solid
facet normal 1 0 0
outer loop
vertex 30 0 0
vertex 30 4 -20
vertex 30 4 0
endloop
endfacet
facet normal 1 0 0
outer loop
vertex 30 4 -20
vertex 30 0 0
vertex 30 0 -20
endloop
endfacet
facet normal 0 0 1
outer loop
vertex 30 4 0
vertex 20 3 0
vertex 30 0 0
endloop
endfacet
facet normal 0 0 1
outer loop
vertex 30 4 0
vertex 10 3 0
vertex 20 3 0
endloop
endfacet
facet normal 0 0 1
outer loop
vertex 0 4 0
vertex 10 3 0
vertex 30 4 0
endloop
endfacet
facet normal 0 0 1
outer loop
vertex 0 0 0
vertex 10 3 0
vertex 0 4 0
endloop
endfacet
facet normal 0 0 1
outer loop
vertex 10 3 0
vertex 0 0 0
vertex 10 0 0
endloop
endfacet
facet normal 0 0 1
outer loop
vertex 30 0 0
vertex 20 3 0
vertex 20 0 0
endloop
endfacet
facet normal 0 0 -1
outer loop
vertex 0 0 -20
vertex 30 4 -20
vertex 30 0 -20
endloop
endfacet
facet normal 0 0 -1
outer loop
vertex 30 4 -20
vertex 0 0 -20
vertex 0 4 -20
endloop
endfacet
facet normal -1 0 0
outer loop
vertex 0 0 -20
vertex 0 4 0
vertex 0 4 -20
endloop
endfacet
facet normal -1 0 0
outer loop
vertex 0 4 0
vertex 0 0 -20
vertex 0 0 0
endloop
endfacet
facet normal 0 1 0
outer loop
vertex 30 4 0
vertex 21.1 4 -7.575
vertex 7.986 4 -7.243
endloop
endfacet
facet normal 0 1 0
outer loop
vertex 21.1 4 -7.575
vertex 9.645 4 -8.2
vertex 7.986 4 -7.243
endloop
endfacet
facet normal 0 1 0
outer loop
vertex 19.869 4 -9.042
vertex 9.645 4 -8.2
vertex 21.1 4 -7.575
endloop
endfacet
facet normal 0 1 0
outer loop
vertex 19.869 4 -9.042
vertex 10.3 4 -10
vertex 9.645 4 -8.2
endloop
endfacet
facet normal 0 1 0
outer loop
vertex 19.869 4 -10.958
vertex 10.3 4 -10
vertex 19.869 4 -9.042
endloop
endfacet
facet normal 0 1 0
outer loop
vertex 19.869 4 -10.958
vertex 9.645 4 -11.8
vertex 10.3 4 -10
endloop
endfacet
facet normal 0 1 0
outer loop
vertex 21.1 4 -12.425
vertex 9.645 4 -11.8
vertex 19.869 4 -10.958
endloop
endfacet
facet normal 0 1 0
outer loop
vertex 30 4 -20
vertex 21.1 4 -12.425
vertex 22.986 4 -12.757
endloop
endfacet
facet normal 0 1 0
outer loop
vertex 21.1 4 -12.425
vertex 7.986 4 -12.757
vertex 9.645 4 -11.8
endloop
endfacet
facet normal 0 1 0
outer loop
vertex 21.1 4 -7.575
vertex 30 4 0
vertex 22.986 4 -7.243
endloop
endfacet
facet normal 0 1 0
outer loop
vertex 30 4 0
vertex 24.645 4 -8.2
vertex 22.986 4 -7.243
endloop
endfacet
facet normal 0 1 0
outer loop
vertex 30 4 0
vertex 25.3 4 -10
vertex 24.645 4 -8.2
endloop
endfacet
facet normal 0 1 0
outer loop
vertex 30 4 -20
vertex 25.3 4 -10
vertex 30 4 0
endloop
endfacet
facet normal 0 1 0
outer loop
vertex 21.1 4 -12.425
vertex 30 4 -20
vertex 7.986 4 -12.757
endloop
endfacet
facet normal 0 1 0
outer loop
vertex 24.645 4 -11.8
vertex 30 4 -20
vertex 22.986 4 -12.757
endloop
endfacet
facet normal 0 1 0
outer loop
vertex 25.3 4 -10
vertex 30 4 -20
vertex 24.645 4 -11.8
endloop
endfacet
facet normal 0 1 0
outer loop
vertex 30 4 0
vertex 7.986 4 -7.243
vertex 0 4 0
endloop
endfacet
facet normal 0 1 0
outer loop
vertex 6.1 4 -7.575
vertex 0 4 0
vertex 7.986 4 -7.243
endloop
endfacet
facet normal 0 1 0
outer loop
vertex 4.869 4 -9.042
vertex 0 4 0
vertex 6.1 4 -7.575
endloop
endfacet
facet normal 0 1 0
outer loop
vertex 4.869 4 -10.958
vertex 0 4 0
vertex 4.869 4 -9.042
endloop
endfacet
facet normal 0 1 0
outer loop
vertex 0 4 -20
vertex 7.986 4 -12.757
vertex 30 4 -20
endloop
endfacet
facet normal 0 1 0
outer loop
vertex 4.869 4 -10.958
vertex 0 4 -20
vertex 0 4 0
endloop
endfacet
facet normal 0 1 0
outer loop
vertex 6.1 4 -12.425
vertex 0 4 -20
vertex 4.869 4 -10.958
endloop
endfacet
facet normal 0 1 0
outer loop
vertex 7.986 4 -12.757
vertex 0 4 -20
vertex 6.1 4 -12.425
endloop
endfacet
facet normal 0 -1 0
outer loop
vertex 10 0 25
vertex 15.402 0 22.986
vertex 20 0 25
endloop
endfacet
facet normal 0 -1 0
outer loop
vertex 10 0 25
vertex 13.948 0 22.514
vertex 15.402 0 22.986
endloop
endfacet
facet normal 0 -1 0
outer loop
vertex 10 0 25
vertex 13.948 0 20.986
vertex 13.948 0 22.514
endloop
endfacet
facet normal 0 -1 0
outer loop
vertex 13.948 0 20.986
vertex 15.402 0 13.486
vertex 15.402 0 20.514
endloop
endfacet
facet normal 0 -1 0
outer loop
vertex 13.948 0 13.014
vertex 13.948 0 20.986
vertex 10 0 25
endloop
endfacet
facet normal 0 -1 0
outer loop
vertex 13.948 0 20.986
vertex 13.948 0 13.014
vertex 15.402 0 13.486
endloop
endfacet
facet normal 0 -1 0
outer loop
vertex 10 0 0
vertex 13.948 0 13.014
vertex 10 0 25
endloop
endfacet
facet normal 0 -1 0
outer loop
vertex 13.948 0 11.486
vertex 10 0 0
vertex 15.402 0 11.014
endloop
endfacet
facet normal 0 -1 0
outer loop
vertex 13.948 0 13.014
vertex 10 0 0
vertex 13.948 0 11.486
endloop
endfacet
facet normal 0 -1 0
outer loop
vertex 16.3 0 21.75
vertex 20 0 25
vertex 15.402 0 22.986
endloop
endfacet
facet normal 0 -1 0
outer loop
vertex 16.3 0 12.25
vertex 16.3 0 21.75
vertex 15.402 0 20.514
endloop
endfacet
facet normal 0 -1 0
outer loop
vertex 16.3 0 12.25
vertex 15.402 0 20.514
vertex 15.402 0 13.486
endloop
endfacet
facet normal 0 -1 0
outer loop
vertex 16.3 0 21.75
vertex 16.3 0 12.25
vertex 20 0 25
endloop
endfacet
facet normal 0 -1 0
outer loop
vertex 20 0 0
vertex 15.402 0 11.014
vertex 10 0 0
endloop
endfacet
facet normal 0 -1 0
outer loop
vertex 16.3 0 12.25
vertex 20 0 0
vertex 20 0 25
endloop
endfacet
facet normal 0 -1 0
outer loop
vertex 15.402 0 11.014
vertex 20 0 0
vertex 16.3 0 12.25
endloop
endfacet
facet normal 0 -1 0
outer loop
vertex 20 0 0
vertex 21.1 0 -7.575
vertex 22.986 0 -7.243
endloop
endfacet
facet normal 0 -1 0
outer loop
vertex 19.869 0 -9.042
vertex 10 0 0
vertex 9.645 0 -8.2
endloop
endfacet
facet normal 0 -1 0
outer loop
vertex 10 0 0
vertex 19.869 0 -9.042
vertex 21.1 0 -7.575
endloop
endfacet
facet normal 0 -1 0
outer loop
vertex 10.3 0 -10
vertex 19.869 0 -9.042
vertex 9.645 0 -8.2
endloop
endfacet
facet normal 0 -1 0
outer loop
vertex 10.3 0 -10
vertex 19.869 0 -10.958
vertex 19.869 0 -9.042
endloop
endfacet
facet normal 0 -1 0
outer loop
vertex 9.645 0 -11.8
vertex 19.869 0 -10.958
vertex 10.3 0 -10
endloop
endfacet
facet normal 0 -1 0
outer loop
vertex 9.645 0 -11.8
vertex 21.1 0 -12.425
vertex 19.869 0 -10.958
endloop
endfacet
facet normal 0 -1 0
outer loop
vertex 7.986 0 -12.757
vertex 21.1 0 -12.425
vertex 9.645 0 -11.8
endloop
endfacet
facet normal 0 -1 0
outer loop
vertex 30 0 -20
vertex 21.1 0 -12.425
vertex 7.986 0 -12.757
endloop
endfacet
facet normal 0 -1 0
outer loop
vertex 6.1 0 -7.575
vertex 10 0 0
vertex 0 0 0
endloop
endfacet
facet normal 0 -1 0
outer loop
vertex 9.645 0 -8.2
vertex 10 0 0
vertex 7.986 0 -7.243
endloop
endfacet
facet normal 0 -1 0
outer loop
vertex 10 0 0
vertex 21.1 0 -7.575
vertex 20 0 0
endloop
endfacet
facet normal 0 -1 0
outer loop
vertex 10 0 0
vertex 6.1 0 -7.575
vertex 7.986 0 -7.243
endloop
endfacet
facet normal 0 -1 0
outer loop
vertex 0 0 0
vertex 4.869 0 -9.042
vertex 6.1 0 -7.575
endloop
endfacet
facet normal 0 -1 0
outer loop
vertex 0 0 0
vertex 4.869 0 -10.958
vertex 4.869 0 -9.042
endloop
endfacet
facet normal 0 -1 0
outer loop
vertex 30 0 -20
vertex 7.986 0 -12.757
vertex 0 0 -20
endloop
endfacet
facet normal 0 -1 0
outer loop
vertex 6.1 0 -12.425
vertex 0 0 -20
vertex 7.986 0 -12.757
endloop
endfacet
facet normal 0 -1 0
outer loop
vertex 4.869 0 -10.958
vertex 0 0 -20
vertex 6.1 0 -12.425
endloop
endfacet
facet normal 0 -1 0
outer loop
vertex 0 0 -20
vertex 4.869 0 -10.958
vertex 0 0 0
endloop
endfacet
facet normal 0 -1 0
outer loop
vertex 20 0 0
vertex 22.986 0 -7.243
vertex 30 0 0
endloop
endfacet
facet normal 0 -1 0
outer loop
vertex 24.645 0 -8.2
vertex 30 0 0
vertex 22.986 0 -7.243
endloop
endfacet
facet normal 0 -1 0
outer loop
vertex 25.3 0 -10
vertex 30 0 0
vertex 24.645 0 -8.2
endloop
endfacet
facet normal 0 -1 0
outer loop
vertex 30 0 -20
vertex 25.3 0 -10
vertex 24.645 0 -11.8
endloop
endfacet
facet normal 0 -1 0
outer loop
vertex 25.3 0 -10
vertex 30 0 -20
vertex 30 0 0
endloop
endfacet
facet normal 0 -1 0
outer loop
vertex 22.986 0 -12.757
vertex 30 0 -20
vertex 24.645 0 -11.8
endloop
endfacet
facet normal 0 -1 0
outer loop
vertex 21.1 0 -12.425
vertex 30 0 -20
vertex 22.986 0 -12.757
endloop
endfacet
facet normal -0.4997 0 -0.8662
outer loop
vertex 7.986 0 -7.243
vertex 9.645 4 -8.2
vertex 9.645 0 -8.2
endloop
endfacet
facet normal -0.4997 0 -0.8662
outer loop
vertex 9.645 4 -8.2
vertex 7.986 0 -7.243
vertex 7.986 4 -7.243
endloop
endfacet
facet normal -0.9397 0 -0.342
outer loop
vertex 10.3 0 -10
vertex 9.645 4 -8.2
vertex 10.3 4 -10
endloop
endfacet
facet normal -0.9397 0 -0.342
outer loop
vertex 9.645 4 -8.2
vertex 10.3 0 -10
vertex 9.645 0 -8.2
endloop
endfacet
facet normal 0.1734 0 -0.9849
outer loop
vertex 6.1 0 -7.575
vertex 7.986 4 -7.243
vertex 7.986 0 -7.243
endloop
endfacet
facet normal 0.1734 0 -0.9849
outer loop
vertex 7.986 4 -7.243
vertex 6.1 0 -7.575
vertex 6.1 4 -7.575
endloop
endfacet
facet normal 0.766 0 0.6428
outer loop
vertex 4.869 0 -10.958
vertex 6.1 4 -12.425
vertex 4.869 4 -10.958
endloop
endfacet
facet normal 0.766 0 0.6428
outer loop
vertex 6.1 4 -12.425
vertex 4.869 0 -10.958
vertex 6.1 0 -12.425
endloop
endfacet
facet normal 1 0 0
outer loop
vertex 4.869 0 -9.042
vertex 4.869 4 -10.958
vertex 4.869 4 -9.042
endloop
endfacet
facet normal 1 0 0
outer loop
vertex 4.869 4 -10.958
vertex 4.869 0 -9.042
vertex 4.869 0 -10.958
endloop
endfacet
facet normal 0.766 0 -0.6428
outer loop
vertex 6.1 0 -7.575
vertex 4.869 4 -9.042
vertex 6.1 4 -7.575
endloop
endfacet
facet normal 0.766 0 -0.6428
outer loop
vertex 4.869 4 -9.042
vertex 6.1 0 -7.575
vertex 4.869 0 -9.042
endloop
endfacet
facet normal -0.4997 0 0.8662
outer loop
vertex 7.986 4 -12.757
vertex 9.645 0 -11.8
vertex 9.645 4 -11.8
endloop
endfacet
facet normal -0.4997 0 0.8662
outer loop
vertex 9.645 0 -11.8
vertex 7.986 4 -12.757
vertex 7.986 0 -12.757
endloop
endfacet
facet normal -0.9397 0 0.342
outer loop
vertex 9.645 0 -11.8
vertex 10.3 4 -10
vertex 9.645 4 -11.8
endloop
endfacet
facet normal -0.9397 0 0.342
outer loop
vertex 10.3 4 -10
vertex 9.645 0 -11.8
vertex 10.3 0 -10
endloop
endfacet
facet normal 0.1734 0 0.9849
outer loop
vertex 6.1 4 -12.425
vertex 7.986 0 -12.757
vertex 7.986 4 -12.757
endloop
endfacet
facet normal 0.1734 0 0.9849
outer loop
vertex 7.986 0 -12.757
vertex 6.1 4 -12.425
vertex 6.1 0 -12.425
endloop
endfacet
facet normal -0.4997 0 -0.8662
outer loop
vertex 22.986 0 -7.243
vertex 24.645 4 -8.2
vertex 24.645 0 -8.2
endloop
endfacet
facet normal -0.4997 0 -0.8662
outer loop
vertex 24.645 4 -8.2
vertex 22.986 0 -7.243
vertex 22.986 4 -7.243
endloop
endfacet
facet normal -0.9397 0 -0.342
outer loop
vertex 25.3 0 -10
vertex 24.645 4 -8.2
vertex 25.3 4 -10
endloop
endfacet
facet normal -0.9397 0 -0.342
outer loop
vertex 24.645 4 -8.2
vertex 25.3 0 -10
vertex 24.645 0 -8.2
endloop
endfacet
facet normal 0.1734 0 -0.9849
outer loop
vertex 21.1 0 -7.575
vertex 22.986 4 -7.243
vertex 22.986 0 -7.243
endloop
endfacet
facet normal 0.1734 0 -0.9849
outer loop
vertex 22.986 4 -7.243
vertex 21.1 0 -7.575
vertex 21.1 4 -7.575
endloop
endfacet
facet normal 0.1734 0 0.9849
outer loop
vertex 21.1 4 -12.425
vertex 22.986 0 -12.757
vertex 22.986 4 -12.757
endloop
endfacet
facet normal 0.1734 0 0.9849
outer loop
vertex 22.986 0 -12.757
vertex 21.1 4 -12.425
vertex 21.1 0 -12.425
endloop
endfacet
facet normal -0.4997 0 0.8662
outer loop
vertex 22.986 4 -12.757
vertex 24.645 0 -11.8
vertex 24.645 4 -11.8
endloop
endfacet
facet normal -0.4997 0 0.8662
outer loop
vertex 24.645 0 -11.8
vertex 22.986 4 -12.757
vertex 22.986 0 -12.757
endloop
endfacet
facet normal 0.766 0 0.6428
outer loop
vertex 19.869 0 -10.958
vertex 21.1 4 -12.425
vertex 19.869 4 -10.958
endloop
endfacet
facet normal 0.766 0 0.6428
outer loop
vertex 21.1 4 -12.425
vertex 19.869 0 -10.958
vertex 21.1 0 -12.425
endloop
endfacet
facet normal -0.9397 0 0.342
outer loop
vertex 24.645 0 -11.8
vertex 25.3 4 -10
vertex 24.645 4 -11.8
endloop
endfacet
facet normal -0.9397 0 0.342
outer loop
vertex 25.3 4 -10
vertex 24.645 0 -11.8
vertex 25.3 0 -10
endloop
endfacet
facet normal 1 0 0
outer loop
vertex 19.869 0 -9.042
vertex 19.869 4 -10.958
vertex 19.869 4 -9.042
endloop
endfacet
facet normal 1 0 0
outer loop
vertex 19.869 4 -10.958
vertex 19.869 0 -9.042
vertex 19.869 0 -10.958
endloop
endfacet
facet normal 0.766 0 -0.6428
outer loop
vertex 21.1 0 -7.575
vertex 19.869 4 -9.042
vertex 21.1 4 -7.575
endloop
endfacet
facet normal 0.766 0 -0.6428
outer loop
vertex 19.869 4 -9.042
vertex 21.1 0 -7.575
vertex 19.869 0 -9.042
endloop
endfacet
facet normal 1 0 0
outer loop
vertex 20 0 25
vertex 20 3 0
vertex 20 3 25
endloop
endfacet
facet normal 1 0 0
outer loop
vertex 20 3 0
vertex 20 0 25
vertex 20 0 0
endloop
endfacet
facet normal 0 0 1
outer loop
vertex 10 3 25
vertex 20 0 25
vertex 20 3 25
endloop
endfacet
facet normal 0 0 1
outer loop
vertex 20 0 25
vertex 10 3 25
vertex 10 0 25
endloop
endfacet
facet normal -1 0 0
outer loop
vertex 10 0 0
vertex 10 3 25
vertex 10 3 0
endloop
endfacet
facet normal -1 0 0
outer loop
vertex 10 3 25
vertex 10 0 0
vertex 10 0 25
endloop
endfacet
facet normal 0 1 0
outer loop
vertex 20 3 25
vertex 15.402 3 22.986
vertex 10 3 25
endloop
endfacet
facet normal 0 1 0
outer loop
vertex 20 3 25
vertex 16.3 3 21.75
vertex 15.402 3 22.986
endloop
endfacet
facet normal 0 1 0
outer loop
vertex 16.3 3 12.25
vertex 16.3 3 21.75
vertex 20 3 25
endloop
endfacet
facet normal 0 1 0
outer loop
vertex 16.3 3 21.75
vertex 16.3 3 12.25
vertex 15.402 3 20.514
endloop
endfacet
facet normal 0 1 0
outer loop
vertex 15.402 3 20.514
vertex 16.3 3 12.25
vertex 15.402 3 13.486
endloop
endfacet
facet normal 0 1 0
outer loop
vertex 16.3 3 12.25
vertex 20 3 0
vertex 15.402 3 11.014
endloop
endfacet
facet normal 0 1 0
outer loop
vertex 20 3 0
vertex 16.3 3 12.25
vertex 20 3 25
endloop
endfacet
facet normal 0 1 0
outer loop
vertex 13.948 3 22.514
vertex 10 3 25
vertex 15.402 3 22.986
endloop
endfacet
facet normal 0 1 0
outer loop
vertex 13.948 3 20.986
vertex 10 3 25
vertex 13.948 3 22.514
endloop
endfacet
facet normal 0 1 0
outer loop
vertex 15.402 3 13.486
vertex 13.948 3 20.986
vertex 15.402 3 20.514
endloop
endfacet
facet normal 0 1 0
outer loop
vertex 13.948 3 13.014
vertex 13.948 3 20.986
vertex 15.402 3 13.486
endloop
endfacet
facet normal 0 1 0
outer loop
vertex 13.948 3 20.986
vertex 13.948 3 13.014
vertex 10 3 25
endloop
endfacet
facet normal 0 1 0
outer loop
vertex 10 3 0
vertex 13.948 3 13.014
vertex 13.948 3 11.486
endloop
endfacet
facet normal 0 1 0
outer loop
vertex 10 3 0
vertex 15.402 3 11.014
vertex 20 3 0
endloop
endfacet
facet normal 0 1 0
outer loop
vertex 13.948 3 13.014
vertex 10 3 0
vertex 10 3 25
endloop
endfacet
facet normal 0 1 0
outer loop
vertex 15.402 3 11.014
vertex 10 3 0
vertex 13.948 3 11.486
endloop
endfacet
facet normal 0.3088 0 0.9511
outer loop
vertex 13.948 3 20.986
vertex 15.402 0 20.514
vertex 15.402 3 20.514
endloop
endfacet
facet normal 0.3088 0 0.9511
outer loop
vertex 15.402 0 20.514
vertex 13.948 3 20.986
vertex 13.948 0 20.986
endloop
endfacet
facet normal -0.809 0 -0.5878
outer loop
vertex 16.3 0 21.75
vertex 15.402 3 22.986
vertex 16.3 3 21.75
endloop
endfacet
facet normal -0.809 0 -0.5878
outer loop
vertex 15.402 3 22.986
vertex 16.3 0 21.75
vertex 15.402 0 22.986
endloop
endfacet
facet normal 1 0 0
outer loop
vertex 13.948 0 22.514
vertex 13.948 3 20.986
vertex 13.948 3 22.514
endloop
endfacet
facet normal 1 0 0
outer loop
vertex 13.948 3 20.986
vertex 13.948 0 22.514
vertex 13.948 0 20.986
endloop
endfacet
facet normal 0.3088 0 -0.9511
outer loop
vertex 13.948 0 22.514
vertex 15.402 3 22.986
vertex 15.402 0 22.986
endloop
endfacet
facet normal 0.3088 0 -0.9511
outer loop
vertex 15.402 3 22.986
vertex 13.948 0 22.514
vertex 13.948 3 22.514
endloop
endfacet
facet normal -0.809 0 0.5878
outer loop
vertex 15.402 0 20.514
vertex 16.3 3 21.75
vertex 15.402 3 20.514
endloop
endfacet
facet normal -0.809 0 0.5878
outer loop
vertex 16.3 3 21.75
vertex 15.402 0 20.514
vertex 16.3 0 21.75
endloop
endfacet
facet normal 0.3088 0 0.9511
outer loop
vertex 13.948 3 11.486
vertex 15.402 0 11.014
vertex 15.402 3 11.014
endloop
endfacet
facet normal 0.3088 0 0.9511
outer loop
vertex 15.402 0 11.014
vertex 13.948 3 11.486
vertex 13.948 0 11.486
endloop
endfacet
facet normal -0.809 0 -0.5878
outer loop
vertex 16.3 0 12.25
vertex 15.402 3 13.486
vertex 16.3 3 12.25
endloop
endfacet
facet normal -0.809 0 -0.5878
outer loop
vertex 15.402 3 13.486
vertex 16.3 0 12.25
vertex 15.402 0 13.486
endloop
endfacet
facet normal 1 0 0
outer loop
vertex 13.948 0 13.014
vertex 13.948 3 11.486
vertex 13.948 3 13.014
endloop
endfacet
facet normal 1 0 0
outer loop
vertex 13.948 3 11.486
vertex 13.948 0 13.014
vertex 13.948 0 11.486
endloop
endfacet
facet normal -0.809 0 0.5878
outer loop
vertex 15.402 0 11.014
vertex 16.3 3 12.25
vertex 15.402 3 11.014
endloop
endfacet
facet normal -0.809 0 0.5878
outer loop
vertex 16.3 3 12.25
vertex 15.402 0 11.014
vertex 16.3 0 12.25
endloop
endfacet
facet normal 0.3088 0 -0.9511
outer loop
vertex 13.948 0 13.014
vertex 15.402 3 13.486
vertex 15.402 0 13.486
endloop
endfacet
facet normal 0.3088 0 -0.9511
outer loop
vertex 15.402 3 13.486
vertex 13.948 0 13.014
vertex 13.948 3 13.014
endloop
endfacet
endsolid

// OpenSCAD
// switch hole distance
s_h_dist = 9.5;

// switch hole diameter
s_h_dia = 2+0.6;

// switch length
s_l = 20;
offset = 5;

width = 30;
length = 20;
height = 20;

thickness = 4;

// 2020 attach

difference(){
    translate([0,0,-20])
    cube([width,thickness,20]);
    translate([1/4*width,5,-10]) rotate([90,0,0])#cylinder(2*thickness,d=5+0.6);
    translate([3/4*width,5,-10]) rotate([90,0,0])#cylinder(2*thickness,d=5+0.6);
}

// Limit switch attach
translate([length/2,0,0]) cube([width/3,thickness*0.75,5]);
translate([0,0,offset])
difference(){
    translate([length/2,0,0]) cube([width/3,thickness*0.75,s_l]);
    translate([length/2+width/6,thickness,(s_l+4+s_h_dist)/2]) rotate([90,0,0]) 
    cylinder(thickness*1.5,d=s_h_dia);
    translate([length/2+width/6,thickness,(s_l+4-s_h_dist)/2]) rotate([90,0,0]) 
    cylinder(thickness*1.5,d=s_h_dia);
}
